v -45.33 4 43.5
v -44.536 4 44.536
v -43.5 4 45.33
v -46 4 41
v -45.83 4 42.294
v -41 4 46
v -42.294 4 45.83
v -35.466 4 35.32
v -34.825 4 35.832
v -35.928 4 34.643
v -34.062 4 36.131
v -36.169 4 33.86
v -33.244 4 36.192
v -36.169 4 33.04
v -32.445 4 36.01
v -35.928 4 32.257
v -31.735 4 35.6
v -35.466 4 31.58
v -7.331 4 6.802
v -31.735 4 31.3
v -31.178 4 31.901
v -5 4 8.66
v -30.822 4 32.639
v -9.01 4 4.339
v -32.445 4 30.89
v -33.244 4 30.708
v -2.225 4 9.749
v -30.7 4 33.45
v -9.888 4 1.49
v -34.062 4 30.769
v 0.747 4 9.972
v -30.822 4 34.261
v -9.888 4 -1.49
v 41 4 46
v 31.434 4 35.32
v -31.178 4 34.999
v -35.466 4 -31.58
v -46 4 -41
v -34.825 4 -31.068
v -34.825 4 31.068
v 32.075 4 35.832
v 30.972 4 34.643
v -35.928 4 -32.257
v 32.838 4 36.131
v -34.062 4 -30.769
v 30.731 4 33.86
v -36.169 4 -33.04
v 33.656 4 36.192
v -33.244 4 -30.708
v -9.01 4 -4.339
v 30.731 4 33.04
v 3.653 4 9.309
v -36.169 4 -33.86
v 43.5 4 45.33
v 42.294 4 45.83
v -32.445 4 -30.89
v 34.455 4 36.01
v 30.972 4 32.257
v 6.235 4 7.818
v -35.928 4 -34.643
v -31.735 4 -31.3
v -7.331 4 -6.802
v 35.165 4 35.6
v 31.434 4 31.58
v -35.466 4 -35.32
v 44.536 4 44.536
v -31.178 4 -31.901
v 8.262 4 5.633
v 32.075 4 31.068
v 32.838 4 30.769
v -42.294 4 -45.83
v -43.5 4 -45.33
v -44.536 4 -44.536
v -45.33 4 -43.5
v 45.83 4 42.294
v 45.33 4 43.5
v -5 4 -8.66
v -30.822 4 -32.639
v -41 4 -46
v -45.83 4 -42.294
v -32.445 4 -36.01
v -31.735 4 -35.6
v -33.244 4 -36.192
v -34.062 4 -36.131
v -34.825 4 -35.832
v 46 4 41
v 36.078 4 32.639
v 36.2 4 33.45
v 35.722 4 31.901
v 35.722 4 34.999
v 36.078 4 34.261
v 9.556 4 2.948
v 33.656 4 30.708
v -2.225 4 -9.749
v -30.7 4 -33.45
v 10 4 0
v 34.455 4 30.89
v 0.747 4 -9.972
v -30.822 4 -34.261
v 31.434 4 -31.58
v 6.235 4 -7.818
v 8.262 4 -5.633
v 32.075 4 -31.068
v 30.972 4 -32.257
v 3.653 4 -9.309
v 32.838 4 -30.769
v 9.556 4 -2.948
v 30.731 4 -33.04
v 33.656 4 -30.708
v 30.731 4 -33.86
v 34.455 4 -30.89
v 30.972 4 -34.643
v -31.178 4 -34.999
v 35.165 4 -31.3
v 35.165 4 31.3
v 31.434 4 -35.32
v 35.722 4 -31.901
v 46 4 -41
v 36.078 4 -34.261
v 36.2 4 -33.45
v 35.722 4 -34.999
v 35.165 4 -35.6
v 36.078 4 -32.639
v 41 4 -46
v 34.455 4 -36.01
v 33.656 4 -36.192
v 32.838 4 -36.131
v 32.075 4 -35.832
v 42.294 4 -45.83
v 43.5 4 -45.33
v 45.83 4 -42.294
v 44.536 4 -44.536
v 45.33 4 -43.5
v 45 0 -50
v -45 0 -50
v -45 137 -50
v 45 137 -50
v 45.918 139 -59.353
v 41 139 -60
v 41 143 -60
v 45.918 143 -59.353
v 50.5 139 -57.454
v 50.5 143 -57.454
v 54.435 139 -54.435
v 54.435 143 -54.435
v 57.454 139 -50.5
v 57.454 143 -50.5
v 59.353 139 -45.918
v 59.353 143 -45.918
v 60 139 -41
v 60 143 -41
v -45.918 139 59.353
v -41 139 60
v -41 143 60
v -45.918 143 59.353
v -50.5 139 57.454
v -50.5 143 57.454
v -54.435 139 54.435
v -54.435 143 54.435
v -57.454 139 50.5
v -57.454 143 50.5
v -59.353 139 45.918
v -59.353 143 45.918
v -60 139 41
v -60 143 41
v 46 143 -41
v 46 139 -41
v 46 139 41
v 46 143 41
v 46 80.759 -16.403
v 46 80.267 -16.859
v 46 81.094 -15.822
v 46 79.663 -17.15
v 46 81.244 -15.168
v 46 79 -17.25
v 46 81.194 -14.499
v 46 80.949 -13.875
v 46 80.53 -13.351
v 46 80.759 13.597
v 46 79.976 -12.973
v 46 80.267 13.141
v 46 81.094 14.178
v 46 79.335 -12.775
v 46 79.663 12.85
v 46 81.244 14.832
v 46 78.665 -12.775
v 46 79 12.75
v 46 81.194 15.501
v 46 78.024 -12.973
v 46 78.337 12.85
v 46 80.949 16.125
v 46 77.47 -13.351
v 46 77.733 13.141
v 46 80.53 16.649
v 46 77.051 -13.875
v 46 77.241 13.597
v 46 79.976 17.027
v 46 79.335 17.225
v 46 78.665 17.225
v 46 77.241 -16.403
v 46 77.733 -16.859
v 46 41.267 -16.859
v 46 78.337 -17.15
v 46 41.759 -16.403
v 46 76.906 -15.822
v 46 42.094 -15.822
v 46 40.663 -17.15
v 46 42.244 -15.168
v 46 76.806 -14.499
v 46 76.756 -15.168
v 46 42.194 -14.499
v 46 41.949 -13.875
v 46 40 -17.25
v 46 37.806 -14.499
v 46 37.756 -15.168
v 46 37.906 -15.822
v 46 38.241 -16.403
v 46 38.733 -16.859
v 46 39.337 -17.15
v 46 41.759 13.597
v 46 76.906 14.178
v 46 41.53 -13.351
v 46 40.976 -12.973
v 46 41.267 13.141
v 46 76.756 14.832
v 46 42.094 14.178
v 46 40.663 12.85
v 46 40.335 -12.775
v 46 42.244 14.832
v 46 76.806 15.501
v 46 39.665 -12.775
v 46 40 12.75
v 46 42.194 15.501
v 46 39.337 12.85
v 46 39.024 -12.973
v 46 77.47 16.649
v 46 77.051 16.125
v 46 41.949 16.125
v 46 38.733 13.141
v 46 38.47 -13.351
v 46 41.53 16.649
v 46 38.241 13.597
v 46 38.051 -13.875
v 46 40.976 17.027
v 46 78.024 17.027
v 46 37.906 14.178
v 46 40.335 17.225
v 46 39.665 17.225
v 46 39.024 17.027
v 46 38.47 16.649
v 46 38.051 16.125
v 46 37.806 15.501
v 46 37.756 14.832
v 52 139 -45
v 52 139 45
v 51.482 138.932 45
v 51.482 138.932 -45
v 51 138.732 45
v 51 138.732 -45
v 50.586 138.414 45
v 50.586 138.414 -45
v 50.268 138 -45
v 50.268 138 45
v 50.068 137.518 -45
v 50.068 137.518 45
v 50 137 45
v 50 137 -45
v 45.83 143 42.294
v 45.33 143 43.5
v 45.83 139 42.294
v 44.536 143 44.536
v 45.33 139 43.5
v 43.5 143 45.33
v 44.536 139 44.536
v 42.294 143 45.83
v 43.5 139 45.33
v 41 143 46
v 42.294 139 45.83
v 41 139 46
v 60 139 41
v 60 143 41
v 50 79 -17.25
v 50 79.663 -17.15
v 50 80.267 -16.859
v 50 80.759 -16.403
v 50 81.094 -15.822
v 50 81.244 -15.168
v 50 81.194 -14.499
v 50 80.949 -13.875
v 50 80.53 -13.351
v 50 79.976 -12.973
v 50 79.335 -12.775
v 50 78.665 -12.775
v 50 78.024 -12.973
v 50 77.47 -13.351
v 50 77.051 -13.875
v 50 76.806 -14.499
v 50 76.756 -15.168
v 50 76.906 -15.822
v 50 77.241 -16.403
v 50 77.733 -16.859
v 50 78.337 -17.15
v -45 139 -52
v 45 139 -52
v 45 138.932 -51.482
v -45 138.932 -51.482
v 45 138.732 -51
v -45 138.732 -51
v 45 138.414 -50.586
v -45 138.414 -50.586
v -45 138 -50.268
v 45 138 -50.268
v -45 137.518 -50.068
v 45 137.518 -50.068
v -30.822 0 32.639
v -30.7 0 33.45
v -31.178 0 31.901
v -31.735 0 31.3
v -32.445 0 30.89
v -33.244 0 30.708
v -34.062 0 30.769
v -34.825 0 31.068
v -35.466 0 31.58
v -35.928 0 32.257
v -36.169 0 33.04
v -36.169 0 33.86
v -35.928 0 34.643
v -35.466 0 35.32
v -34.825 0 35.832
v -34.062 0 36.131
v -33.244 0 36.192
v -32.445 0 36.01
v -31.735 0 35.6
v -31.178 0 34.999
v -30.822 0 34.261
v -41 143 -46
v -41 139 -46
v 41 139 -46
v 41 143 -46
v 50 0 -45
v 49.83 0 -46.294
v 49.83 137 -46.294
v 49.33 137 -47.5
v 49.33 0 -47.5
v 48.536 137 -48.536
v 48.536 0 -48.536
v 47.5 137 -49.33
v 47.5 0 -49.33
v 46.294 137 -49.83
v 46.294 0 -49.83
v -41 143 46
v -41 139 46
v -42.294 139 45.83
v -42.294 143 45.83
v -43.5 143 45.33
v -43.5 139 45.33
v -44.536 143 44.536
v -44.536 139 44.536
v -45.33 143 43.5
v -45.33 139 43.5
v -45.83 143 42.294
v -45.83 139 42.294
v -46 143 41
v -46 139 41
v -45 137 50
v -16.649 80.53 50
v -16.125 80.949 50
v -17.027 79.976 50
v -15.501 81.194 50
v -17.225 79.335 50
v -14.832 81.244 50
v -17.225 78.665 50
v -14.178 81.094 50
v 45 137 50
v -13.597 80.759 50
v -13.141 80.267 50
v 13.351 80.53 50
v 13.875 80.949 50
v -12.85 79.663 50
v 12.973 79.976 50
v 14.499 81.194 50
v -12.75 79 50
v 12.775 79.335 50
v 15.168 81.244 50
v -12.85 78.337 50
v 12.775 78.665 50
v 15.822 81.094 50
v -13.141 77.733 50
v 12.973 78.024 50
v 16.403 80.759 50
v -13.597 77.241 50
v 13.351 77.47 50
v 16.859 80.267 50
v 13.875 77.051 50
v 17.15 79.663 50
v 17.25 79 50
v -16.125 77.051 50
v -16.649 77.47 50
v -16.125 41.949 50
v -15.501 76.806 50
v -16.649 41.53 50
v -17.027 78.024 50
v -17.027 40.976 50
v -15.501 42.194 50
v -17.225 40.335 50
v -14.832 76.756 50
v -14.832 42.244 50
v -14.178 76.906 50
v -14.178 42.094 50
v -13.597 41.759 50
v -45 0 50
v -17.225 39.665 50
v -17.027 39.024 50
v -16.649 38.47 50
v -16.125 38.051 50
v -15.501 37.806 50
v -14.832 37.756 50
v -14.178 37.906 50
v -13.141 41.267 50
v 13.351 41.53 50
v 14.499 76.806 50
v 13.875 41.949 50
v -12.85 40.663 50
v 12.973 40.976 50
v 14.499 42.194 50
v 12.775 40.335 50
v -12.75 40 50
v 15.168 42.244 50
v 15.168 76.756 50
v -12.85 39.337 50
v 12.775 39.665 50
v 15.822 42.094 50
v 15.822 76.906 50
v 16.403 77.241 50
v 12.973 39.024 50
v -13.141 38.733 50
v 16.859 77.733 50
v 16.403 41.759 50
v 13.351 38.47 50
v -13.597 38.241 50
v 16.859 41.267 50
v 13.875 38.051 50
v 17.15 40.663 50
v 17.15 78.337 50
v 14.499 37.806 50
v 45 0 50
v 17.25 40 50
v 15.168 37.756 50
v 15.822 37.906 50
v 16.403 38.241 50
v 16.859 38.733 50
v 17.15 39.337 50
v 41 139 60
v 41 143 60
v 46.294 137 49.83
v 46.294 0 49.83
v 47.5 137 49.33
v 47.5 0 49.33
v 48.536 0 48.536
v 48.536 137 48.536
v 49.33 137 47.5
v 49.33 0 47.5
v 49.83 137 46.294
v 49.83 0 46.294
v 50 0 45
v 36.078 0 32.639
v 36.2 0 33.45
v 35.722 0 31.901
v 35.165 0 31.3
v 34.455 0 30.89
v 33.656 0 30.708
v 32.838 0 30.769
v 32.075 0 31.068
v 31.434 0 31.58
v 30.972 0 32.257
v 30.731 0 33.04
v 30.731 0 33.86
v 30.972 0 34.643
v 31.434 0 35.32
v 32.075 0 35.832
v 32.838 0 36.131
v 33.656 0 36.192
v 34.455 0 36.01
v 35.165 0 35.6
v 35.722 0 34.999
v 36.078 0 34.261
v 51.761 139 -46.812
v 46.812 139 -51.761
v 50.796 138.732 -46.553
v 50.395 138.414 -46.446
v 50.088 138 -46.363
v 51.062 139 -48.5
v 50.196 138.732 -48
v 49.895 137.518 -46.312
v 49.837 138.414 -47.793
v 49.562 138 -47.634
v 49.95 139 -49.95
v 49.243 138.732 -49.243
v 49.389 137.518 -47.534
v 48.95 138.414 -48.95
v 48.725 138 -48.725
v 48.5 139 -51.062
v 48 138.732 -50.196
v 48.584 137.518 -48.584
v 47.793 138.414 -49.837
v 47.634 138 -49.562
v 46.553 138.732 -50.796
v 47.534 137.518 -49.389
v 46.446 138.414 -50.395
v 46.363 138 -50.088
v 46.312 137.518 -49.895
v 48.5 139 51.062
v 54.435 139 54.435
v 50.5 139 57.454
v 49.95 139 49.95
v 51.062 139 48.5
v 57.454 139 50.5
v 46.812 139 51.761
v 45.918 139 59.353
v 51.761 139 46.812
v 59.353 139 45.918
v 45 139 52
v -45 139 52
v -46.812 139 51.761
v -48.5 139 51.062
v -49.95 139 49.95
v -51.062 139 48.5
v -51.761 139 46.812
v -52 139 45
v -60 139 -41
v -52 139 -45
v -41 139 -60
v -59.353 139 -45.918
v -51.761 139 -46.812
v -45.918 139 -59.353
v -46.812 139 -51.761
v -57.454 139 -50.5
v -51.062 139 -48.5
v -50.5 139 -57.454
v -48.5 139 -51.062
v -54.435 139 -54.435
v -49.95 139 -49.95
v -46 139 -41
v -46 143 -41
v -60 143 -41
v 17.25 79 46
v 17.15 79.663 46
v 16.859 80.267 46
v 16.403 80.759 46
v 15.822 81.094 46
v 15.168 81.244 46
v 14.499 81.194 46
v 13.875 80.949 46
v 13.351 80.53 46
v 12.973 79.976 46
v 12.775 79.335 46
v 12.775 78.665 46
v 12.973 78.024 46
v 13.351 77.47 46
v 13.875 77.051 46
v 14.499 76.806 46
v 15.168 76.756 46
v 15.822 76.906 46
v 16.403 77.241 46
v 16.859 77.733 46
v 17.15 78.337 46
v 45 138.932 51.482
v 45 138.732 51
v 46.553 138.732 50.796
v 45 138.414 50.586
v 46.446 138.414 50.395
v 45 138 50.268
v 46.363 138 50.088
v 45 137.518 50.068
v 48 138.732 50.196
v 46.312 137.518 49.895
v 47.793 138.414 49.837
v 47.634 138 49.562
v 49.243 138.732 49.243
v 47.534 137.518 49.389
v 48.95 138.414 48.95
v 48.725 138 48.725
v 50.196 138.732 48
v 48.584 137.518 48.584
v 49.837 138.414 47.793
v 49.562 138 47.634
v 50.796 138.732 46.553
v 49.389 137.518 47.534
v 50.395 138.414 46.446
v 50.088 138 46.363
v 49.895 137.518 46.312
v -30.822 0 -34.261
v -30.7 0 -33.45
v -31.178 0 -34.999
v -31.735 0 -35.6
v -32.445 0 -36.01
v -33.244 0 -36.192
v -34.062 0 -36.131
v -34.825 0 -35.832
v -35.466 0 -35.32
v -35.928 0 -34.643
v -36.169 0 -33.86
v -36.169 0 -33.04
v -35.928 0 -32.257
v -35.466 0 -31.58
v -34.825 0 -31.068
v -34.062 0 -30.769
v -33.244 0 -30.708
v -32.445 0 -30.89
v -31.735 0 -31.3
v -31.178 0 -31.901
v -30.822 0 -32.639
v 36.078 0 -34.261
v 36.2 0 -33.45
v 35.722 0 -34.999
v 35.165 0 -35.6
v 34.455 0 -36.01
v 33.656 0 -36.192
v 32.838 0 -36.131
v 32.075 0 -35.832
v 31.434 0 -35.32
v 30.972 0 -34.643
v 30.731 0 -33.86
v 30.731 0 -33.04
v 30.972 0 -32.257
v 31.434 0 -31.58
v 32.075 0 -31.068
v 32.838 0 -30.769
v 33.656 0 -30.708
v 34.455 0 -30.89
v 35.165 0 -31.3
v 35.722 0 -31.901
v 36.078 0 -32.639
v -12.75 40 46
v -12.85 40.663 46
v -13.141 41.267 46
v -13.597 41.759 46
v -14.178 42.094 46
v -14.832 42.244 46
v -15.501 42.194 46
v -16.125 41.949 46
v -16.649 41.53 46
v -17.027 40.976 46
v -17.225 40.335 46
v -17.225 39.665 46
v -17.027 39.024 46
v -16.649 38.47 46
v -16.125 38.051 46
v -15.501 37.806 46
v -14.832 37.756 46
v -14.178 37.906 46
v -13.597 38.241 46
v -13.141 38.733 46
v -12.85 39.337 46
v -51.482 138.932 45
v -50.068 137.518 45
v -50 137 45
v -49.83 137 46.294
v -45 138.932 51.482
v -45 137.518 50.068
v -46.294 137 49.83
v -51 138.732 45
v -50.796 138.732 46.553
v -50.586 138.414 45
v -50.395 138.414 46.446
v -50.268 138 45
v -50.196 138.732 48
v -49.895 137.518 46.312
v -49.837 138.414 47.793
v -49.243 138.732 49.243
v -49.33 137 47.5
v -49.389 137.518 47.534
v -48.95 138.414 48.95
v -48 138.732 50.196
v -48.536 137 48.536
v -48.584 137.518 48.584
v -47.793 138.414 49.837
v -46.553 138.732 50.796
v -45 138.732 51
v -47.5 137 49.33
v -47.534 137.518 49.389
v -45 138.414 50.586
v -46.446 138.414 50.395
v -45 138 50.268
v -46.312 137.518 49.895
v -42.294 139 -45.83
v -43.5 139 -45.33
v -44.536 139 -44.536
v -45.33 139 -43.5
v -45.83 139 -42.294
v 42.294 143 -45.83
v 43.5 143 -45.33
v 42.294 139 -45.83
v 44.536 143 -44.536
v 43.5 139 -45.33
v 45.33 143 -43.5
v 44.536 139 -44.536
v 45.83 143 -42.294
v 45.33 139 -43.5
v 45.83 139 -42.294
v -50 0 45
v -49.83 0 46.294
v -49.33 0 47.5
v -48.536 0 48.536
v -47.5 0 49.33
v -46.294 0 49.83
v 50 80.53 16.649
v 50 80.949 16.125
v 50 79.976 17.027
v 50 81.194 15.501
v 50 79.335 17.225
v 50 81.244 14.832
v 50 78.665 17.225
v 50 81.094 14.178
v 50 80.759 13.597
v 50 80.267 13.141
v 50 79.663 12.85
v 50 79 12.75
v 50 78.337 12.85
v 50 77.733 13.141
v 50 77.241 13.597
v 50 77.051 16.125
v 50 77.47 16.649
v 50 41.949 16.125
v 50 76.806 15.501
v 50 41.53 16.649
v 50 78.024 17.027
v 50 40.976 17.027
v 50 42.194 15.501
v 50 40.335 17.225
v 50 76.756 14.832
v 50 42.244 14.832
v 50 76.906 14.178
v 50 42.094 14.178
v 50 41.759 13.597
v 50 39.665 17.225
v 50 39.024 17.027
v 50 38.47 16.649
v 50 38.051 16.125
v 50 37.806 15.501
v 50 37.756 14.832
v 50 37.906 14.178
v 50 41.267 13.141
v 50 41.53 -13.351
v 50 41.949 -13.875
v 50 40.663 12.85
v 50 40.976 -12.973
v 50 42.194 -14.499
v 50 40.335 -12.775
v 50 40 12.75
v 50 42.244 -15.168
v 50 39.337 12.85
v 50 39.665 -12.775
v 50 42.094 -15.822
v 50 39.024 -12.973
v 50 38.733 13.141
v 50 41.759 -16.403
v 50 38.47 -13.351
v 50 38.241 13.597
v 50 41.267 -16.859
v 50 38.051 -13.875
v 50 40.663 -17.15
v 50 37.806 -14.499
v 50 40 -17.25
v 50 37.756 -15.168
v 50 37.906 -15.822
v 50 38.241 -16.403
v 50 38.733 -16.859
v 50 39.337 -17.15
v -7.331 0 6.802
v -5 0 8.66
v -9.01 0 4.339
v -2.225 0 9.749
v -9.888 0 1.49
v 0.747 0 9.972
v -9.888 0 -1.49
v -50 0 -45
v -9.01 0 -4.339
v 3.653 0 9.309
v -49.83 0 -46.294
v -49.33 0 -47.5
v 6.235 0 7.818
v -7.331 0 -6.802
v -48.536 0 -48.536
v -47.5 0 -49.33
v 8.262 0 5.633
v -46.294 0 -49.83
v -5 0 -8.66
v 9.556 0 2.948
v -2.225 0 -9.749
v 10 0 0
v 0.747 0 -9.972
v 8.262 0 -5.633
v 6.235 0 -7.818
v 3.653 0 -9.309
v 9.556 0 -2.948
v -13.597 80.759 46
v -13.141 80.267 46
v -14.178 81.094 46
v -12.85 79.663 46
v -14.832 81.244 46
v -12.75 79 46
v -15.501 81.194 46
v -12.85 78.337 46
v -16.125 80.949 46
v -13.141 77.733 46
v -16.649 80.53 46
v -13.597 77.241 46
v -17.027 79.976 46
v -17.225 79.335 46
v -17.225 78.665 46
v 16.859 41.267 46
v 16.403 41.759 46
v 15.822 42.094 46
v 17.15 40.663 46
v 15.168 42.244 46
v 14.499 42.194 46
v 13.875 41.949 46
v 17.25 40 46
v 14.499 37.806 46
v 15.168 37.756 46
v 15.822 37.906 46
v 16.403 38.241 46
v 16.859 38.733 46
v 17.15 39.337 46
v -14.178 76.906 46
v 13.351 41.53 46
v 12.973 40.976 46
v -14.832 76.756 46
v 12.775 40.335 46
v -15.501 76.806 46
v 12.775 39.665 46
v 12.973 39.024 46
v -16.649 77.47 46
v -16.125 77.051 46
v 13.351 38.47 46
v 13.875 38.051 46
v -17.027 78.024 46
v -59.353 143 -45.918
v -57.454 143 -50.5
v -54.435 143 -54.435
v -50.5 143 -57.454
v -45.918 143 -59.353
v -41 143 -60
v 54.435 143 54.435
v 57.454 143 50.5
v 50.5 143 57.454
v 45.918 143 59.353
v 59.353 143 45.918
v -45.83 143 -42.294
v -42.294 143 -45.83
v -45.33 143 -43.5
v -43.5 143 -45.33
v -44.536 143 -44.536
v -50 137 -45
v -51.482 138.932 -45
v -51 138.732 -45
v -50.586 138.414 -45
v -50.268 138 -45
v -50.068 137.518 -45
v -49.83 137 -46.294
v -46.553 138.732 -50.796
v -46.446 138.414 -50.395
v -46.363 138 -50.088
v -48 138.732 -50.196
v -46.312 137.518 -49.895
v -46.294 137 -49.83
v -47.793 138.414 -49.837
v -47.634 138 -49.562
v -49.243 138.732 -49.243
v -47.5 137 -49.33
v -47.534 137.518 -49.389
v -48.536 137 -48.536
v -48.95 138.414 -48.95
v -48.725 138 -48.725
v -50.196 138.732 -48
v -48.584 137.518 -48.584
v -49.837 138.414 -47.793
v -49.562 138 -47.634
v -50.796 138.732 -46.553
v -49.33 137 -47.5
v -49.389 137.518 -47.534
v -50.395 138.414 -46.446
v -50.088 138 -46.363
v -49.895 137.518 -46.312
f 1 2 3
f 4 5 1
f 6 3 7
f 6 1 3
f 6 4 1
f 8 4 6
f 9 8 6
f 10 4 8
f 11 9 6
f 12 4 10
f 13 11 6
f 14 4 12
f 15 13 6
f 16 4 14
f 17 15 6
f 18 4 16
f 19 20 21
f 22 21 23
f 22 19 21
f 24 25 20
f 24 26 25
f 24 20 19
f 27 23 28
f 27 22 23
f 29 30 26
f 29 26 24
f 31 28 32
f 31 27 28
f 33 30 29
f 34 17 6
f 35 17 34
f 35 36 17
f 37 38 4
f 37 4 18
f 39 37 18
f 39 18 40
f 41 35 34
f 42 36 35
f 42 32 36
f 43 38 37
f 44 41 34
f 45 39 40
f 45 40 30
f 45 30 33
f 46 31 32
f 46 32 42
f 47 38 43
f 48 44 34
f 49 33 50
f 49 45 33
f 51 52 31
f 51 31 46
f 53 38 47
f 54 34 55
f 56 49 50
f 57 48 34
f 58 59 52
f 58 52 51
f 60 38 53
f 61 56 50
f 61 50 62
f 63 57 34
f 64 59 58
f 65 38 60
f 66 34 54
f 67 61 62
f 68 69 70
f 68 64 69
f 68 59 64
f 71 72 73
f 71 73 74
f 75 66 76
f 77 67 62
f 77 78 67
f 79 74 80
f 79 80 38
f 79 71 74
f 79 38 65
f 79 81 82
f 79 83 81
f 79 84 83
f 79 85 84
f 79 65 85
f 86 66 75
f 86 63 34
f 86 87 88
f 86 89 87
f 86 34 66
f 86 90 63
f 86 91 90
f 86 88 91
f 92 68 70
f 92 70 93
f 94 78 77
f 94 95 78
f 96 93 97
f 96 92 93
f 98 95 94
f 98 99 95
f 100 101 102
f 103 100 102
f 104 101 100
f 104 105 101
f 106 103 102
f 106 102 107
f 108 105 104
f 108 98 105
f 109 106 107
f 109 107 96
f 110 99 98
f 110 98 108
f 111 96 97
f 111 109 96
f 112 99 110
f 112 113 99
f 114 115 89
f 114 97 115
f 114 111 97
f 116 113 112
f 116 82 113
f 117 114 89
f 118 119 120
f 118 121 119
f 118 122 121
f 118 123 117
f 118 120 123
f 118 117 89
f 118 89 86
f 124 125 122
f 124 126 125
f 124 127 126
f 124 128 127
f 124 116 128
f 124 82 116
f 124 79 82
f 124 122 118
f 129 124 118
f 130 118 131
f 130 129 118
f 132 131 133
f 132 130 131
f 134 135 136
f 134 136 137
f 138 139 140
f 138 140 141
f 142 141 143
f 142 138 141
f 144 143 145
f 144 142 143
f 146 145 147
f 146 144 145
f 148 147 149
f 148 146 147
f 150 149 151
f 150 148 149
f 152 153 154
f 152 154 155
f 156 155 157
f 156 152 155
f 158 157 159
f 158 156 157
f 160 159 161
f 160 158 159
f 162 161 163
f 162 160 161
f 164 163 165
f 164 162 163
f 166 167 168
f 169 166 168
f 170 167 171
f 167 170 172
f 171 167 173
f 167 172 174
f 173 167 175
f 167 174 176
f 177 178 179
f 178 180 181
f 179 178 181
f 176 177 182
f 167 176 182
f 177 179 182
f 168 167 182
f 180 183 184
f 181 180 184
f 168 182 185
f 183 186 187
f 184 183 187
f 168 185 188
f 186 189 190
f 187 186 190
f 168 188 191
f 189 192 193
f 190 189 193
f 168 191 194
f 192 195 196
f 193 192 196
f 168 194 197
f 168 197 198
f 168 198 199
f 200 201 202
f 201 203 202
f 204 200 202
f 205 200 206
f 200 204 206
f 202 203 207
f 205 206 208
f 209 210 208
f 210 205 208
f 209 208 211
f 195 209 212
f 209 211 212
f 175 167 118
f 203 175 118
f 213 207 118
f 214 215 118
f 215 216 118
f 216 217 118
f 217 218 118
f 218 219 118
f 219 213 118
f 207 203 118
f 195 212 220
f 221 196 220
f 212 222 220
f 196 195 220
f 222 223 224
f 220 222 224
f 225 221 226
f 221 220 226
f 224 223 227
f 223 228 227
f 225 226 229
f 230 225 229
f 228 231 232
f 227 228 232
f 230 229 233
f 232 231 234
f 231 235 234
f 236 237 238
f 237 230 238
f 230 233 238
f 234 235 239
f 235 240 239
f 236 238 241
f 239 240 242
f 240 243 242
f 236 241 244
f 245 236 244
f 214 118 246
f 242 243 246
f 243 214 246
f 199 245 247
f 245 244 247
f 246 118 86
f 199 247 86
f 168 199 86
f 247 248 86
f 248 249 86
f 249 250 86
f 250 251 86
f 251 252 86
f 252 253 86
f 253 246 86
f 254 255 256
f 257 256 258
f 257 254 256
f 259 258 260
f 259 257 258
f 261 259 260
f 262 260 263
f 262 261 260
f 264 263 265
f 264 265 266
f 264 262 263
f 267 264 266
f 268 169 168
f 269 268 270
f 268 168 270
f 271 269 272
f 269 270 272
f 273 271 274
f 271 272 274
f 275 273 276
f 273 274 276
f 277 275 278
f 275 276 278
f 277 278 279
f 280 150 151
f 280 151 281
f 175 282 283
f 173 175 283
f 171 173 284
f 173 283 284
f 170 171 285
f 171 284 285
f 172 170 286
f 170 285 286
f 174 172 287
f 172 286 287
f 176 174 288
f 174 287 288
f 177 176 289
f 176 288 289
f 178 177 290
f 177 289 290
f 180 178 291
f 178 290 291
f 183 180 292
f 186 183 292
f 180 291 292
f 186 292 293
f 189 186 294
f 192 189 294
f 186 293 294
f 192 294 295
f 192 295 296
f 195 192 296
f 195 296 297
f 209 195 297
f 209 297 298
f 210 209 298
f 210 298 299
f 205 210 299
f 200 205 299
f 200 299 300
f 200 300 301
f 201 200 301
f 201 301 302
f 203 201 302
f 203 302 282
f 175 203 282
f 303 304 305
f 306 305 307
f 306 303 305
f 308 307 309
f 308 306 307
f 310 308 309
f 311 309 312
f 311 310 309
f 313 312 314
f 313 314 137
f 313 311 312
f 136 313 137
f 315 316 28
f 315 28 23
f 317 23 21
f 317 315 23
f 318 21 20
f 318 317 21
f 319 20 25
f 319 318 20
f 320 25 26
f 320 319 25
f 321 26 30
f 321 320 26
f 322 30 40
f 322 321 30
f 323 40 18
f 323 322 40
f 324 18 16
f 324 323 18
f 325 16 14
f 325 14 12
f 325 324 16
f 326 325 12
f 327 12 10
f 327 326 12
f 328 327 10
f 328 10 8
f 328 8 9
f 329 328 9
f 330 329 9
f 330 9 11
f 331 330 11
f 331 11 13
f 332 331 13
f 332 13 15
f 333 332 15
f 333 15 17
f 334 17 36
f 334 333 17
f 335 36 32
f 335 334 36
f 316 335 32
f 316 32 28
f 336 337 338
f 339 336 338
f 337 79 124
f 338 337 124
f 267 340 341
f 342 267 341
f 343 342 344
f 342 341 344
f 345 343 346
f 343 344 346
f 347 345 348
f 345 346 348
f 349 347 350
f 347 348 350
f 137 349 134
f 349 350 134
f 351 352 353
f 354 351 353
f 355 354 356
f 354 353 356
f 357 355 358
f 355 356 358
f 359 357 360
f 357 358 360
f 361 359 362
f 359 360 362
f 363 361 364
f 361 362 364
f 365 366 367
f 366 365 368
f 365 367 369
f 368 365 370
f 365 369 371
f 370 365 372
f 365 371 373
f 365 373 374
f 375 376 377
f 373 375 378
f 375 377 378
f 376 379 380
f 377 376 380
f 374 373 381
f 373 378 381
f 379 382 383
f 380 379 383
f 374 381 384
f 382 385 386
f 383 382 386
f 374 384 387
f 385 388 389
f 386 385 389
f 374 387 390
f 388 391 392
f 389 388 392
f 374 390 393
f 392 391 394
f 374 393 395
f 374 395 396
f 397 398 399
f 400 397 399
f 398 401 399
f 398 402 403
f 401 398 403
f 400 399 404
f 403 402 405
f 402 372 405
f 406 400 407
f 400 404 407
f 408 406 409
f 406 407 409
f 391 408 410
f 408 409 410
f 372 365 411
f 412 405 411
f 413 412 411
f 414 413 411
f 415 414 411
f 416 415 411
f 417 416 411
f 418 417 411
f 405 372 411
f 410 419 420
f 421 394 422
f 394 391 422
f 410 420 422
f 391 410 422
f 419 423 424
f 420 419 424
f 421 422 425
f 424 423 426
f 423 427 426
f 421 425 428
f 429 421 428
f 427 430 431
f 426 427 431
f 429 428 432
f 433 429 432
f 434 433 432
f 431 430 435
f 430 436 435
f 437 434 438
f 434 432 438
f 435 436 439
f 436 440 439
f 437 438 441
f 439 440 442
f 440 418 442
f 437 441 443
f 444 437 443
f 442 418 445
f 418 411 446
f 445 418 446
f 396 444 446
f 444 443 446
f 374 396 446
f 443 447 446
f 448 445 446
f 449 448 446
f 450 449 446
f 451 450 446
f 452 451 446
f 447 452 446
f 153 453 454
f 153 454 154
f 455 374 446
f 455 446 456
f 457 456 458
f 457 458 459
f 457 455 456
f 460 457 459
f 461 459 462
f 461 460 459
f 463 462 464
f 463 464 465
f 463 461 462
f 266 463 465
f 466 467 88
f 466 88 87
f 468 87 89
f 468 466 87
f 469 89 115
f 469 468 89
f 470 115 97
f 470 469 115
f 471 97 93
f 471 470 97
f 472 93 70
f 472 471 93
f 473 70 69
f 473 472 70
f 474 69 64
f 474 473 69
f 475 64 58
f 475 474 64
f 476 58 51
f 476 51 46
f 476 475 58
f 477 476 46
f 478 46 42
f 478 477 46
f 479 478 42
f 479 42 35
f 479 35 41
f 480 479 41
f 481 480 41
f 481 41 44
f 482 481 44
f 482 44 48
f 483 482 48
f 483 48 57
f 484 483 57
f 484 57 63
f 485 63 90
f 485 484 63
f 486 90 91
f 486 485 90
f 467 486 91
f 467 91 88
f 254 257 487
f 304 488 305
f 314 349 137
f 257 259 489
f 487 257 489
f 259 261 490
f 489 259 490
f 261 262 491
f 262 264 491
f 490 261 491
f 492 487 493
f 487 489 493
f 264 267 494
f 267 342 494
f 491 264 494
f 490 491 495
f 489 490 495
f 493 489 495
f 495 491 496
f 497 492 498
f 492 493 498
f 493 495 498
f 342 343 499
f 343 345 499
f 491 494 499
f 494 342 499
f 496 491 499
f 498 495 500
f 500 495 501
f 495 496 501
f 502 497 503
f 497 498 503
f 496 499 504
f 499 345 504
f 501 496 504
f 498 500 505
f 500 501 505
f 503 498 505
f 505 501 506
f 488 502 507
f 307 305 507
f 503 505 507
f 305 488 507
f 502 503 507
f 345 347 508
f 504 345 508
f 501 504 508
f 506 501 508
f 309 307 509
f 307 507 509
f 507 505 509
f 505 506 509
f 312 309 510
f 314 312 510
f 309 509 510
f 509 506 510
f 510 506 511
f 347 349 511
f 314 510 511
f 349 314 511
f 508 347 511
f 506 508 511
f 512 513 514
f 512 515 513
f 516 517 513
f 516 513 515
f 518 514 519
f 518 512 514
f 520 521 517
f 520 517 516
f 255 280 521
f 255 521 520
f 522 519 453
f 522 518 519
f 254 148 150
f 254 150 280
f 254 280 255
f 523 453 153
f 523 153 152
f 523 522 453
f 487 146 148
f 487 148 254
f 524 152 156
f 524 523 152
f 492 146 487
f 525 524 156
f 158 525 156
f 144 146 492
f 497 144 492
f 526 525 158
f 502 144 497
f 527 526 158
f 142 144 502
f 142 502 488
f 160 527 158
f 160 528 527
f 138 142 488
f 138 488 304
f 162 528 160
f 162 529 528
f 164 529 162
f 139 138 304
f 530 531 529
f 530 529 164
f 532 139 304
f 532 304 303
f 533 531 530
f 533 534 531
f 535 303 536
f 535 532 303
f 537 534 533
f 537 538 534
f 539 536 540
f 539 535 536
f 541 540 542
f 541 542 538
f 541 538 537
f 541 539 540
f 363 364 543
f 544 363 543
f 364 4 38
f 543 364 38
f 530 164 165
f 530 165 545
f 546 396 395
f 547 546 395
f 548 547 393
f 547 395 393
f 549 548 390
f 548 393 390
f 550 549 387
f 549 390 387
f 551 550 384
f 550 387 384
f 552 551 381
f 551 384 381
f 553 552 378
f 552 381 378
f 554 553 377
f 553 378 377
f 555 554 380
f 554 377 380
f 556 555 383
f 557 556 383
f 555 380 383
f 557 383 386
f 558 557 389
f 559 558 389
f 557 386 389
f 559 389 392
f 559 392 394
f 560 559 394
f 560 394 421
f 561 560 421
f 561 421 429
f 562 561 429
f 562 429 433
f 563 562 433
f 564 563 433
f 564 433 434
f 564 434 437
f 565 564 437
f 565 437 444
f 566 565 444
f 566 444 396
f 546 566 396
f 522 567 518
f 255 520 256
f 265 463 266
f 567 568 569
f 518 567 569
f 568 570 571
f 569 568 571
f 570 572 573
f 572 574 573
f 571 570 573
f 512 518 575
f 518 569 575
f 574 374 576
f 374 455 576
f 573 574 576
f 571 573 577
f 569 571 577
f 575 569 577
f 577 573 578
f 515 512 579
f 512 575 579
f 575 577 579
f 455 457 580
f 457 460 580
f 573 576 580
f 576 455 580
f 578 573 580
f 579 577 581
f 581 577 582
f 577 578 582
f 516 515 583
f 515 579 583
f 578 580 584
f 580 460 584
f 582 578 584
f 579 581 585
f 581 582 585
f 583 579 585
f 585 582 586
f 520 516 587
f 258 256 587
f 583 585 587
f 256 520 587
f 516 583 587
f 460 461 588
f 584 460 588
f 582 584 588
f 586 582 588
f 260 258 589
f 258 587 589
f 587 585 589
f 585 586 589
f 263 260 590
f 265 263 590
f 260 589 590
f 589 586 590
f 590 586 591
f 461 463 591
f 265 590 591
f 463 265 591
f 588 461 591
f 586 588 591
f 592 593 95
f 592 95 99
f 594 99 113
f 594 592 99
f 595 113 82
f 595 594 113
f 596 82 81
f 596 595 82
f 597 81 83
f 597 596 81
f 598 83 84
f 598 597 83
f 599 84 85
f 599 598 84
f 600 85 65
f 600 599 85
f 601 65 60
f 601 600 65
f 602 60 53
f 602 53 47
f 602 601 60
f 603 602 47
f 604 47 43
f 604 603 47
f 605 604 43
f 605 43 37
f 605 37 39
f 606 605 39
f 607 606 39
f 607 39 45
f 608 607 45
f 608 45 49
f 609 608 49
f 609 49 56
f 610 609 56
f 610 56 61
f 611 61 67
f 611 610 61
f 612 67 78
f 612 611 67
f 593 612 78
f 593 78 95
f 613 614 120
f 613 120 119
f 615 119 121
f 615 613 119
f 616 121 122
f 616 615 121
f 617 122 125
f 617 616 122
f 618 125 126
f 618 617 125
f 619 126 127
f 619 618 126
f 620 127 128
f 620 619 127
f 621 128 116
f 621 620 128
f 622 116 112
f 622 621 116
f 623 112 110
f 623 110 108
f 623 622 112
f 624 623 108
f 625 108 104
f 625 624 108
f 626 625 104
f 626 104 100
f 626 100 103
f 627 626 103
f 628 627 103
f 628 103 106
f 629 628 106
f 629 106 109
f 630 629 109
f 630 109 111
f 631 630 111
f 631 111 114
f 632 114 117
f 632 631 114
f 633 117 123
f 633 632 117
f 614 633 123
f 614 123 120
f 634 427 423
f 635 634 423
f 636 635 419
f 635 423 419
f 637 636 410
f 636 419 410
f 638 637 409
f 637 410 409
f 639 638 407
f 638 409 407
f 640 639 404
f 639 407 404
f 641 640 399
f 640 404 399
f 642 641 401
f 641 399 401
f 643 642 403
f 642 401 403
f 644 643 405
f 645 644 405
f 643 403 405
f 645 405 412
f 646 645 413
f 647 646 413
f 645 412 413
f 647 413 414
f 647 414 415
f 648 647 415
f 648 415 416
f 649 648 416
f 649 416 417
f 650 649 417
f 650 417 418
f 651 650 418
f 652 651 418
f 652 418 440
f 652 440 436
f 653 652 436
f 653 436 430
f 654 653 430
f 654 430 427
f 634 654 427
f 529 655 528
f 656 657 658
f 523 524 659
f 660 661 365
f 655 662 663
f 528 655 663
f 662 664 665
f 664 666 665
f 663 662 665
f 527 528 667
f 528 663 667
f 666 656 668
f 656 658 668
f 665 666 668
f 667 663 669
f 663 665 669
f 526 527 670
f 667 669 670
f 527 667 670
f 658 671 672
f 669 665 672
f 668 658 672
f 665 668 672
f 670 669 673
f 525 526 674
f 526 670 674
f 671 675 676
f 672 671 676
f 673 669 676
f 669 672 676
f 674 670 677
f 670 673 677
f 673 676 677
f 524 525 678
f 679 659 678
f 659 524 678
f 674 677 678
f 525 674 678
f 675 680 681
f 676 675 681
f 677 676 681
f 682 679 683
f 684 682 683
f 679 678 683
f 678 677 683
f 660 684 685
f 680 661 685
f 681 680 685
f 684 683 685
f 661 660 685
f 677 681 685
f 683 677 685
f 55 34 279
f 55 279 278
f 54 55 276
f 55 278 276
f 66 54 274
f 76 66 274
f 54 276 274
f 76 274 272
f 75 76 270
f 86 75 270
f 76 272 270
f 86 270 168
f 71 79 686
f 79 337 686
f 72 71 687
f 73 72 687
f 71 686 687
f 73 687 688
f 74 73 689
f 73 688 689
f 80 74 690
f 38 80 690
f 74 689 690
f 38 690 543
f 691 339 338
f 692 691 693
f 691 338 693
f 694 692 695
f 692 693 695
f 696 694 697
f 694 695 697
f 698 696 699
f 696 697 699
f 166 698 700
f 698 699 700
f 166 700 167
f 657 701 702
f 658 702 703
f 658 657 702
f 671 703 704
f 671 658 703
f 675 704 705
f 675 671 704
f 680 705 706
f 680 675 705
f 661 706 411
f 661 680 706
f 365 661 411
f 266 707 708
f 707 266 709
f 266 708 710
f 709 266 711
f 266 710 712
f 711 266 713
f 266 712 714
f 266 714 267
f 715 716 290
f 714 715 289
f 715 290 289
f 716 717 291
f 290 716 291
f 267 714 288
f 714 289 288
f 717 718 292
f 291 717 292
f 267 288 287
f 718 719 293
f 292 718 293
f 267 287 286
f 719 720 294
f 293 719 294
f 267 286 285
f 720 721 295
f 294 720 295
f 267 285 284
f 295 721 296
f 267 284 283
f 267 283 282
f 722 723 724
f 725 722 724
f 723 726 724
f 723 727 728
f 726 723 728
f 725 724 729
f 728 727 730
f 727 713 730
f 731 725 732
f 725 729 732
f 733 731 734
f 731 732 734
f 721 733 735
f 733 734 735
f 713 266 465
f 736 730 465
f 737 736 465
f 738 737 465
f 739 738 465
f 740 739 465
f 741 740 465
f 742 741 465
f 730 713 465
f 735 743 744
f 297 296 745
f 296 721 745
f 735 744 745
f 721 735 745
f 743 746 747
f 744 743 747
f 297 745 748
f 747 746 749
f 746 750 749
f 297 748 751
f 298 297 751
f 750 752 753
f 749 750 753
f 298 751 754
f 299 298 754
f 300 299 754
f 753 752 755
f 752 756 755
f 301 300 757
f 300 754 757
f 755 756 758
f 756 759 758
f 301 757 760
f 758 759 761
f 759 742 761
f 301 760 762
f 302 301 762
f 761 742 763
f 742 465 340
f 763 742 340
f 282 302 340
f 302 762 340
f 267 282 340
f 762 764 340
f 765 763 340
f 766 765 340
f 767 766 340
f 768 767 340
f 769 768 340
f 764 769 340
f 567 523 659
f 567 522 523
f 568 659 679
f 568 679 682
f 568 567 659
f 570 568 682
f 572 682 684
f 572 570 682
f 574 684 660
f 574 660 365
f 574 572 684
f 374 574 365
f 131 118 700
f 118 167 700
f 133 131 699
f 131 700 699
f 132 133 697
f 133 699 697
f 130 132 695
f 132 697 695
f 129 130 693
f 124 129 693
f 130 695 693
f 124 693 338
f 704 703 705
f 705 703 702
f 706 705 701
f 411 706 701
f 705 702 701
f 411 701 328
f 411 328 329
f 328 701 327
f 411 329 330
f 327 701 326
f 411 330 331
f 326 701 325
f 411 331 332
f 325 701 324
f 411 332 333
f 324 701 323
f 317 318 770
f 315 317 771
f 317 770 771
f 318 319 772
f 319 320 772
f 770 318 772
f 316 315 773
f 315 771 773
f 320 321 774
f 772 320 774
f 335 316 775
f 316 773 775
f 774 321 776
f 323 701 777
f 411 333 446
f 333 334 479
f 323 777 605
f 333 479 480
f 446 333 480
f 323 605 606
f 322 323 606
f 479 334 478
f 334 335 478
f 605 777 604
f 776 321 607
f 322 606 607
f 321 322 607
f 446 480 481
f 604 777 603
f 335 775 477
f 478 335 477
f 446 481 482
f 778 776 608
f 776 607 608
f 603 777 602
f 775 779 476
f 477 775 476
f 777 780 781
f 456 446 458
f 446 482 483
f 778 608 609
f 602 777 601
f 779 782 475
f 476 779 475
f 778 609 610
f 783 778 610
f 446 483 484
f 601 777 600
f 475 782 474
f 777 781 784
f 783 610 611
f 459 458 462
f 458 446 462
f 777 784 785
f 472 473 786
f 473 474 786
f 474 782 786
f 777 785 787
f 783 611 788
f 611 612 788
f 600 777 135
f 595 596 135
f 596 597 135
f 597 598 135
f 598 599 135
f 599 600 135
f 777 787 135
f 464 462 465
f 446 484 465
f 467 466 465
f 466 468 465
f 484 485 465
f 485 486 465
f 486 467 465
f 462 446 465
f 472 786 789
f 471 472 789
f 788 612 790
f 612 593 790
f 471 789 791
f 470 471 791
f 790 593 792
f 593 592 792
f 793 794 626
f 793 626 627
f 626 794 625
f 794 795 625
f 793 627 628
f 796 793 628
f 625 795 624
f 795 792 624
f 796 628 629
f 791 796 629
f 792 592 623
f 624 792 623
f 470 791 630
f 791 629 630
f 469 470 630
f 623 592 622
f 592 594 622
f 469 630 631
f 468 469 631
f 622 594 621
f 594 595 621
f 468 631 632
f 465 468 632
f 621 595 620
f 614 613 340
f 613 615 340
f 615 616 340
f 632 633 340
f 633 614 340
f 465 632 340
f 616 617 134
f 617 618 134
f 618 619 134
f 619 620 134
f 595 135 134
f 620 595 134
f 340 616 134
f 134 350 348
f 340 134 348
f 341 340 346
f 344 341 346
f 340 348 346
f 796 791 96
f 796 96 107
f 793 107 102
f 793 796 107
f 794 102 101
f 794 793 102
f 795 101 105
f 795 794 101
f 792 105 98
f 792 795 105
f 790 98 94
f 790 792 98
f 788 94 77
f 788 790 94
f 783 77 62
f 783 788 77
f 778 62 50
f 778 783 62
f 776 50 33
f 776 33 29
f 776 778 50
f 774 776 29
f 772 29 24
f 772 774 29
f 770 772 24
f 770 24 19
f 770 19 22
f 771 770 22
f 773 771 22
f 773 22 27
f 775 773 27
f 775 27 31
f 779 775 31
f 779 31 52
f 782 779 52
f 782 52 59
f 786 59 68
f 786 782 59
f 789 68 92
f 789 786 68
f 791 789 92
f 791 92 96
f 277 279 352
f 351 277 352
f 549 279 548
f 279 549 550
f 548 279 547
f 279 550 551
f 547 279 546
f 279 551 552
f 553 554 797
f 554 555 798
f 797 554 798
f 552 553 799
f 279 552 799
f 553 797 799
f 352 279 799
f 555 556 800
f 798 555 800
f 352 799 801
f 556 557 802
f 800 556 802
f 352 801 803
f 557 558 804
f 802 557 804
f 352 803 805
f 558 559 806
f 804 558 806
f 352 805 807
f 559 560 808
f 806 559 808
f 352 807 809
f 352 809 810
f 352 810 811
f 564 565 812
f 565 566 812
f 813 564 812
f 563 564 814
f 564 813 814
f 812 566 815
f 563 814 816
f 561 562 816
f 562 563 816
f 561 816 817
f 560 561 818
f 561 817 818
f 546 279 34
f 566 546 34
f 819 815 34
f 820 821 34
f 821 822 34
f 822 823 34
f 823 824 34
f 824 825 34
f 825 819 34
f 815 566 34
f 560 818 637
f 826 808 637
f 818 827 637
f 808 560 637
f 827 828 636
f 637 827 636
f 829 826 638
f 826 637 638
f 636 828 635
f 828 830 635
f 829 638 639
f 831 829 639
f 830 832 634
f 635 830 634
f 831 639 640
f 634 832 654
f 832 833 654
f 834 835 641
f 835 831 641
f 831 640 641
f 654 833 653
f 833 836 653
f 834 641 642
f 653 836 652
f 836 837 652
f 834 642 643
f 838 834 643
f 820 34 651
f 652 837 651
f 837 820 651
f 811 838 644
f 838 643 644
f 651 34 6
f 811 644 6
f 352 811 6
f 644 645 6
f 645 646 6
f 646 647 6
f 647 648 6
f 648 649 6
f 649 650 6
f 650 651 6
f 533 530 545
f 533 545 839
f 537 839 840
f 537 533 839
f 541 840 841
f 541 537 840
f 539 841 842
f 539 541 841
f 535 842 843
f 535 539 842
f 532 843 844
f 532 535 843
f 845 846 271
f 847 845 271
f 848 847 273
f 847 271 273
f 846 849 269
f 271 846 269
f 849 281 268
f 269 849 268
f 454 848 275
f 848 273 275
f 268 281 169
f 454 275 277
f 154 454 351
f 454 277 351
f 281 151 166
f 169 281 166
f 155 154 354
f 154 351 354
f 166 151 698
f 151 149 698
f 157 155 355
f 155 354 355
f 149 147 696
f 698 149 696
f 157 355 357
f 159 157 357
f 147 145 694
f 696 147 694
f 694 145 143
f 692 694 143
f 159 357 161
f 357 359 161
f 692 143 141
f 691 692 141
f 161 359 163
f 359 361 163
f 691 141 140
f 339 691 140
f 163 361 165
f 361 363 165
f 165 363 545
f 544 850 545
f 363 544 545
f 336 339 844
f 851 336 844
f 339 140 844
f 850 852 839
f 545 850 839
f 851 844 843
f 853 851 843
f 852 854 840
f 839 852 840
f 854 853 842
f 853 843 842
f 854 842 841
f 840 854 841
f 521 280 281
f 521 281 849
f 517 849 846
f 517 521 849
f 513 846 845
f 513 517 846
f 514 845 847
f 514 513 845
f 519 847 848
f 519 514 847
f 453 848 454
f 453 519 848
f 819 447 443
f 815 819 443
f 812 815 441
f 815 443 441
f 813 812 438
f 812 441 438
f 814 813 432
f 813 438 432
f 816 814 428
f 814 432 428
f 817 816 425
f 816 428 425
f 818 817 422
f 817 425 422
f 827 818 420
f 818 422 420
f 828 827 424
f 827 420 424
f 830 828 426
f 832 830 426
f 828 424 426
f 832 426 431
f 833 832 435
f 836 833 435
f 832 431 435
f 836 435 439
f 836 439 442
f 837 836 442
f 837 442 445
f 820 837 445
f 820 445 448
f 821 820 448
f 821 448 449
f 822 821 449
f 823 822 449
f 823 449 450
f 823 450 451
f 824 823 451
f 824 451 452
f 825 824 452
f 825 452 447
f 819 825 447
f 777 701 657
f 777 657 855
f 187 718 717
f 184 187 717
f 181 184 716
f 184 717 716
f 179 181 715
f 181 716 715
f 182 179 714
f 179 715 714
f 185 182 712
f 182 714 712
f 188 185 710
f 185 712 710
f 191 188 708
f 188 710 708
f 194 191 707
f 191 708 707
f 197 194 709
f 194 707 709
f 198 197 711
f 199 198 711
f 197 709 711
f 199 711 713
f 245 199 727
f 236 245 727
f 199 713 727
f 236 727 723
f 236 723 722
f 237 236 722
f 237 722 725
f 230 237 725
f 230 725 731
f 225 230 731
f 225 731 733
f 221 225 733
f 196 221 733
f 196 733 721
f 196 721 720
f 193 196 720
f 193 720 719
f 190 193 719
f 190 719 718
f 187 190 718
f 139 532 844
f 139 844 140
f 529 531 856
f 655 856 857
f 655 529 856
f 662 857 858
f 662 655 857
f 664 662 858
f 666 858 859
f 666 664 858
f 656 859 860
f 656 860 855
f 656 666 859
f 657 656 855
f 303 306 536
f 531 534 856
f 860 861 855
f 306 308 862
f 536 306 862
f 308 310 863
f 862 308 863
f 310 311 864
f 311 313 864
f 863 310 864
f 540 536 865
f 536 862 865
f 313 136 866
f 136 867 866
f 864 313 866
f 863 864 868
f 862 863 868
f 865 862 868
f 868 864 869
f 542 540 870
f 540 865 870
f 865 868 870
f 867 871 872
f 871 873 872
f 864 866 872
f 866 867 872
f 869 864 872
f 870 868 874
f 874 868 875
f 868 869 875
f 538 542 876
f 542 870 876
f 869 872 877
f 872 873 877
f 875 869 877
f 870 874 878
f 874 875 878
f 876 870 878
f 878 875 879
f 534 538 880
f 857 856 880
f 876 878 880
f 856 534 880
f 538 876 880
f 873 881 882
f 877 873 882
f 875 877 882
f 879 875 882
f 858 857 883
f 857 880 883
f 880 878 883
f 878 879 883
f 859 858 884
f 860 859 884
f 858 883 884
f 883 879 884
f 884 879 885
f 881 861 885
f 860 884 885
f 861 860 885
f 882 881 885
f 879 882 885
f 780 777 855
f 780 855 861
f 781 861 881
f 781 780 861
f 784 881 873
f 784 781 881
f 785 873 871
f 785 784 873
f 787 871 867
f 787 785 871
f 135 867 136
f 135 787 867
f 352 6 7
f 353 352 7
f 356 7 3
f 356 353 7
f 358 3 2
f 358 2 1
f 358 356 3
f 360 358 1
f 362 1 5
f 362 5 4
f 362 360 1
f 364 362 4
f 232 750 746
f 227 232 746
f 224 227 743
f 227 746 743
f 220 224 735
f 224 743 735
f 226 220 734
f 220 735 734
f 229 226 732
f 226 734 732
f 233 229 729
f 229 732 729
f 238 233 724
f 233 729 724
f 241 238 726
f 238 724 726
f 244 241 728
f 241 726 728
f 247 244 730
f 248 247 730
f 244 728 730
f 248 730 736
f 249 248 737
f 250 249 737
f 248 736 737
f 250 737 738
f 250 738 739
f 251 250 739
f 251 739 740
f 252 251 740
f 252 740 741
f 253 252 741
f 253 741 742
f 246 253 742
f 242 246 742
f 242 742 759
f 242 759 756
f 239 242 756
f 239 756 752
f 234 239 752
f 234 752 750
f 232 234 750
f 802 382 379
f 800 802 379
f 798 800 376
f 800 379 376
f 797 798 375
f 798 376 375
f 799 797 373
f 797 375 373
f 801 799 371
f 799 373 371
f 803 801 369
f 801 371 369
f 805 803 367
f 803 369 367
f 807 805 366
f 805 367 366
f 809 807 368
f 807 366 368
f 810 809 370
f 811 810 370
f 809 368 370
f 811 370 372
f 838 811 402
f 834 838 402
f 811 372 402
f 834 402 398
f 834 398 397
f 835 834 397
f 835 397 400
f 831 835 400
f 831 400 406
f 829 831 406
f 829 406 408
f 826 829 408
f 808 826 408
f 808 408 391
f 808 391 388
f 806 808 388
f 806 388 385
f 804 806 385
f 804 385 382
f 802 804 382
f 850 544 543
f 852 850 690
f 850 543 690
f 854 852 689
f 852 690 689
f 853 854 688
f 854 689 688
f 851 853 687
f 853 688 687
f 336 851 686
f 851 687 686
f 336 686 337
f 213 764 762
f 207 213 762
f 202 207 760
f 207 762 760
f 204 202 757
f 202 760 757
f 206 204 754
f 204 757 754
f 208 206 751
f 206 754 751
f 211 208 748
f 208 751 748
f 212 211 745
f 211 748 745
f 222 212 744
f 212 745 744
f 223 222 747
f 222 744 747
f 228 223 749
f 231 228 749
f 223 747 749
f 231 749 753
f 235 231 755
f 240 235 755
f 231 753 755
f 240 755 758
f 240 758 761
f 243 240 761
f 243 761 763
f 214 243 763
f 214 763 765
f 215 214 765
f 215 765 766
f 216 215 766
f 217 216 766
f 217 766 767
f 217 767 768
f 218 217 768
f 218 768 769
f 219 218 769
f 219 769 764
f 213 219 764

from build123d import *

# Parameters (mm, degrees)
SKETCH1_W           = 100
SKETCH1_H           = 100
SKETCH1_R           = 10
SKETCH1_R_2         = 2.75
BOSS_EXTRUDE1_DEPTH = 4
SKETCH2_W           = 100
SKETCH2_H           = 100
SKETCH2_W_2         = 92
SKETCH2_H_2         = 92
BOSS_EXTRUDE2_DEPTH = 135
FILLET1_R           = 5
BOSS_EXTRUDE3_DEPTH = 4
FILLET2_R           = 2
CUT_EXTRUDE1_REACH  = 112
SKETCH4_R           = 2.25
CUT_EXTRUDE2_REACH  = 112
SKETCH5_R           = 2.25


with BuildPart() as part:
    # Sketch1 → Boss-Extrude1 (new body)
    with BuildSketch(Plane(origin=(0, 0, 0), x_dir=(1, 0, 0), z_dir=(0, 1, 0))):
        Rectangle(SKETCH1_W, SKETCH1_H)
        Circle(SKETCH1_R, mode=Mode.SUBTRACT)
        with Locations((33.45, 33.45)):
            Circle(SKETCH1_R_2, mode=Mode.SUBTRACT)
        with Locations((33.45, -33.45)):
            Circle(SKETCH1_R_2, mode=Mode.SUBTRACT)
        with Locations((-33.45, -33.45)):
            Circle(SKETCH1_R_2, mode=Mode.SUBTRACT)
        with Locations((-33.45, 33.45)):
            Circle(SKETCH1_R_2, mode=Mode.SUBTRACT)
    extrude(amount=BOSS_EXTRUDE1_DEPTH)

    # Sketch2 → Boss-Extrude2 (add)
    with BuildSketch(Plane(origin=(0, 4, 0), x_dir=(1, 0, 0), z_dir=(0, 1, 0))):
        Rectangle(SKETCH2_W, SKETCH2_H)
        Rectangle(SKETCH2_W_2, SKETCH2_H_2, mode=Mode.SUBTRACT)
    extrude(amount=BOSS_EXTRUDE2_DEPTH)

    # Fillet1
    fillet1_edges = [part.edges().sort_by_distance(p)[0] for p in [
        (-46, 71.5, 46),
        (46, 71.5, 46),
        (46, 71.5, -46),
        (-46, 71.5, -46),
        (-50, 69.5, -50),
        (50, 69.5, -50),
        (50, 69.5, 50),
        (-50, 69.5, 50),
    ]]
    fillet(fillet1_edges, radius=FILLET1_R)

    # Sketch3 → Boss-Extrude3 (add)
    with BuildSketch(Plane(origin=(0, 139, 0), x_dir=(1, 0, 0), z_dir=(0, 1, 0))):
        with BuildLine():
            Line((-41, 60), (41, 60))
            ThreePointArc((41, 60), (54.435028843, 54.435028843), (60, 41))
            Line((60, 41), (60, -41))
            ThreePointArc((60, -41), (54.435028843, -54.435028843), (41, -60))
            Line((41, -60), (-41, -60))
            ThreePointArc((-41, -60), (-54.435028843, -54.435028843), (-60, -41))
            Line((-60, -41), (-60, 41))
            ThreePointArc((-60, 41), (-54.435028843, 54.435028843), (-41, 60))
        make_face()
        with BuildLine():
            Line((-41, 46), (41, 46))
            ThreePointArc((41, 46), (44.535533906, 44.535533906), (46, 41))
            Line((46, 41), (46, -41))
            ThreePointArc((46, -41), (44.535533906, -44.535533906), (41, -46))
            Line((41, -46), (-41, -46))
            ThreePointArc((-41, -46), (-44.535533906, -44.535533906), (-46, -41))
            Line((-46, -41), (-46, 41))
            ThreePointArc((-46, 41), (-44.535533906, 44.535533906), (-41, 46))
        make_face(mode=Mode.SUBTRACT)
    extrude(amount=BOSS_EXTRUDE3_DEPTH)

    # Fillet2
    fillet2_edges = [part.edges().sort_by_distance(p)[0] for p in [
        (0, 139, 50),
        (-50, 139, 0),
        (50, 139, 0),
        (0, 139, -50),
        (-48.535533906, 139, -48.535533906),
        (48.535533906, 139, -48.535533906),
        (48.535533906, 139, 48.535533906),
        (-48.535533906, 139, 48.535533906),
    ]]
    fillet(fillet2_edges, radius=FILLET2_R)

    # Sketch4 → Cut-Extrude1 (cut, up to next)
    with BuildSketch(Plane(origin=(50, 0, 0), x_dir=(0, 0, -1), z_dir=(1, 0, 0)), mode=Mode.PRIVATE) as cut_extrude1_sk1:
        with Locations((-15, 79)):
            Circle(SKETCH4_R)
    cut_extrude1_tool1 = extrude(cut_extrude1_sk1.sketch, amount=-CUT_EXTRUDE1_REACH, mode=Mode.PRIVATE) & part.part
    add(cut_extrude1_tool1.solids().sort_by_distance((50, 79, 15))[0], mode=Mode.SUBTRACT)
    # Sketch4 → Cut-Extrude1 (cut, up to next)
    with BuildSketch(Plane(origin=(50, 0, 0), x_dir=(0, 0, -1), z_dir=(1, 0, 0)), mode=Mode.PRIVATE) as cut_extrude1_sk2:
        with Locations((15, 79)):
            Circle(SKETCH4_R)
    cut_extrude1_tool2 = extrude(cut_extrude1_sk2.sketch, amount=-CUT_EXTRUDE1_REACH, mode=Mode.PRIVATE) & part.part
    add(cut_extrude1_tool2.solids().sort_by_distance((50, 79, -15))[0], mode=Mode.SUBTRACT)
    # Sketch4 → Cut-Extrude1 (cut, up to next)
    with BuildSketch(Plane(origin=(50, 0, 0), x_dir=(0, 0, -1), z_dir=(1, 0, 0)), mode=Mode.PRIVATE) as cut_extrude1_sk3:
        with Locations((15, 40)):
            Circle(SKETCH4_R)
    cut_extrude1_tool3 = extrude(cut_extrude1_sk3.sketch, amount=-CUT_EXTRUDE1_REACH, mode=Mode.PRIVATE) & part.part
    add(cut_extrude1_tool3.solids().sort_by_distance((50, 40, -15))[0], mode=Mode.SUBTRACT)
    # Sketch4 → Cut-Extrude1 (cut, up to next)
    with BuildSketch(Plane(origin=(50, 0, 0), x_dir=(0, 0, -1), z_dir=(1, 0, 0)), mode=Mode.PRIVATE) as cut_extrude1_sk4:
        with Locations((-15, 40)):
            Circle(SKETCH4_R)
    cut_extrude1_tool4 = extrude(cut_extrude1_sk4.sketch, amount=-CUT_EXTRUDE1_REACH, mode=Mode.PRIVATE) & part.part
    add(cut_extrude1_tool4.solids().sort_by_distance((50, 40, 15))[0], mode=Mode.SUBTRACT)

    # Sketch5 → Cut-Extrude2 (cut, up to next)
    with BuildSketch(Plane.XY.offset(50), mode=Mode.PRIVATE) as cut_extrude2_sk1:
        with Locations((15, 79)):
            Circle(SKETCH5_R)
    cut_extrude2_tool1 = extrude(cut_extrude2_sk1.sketch, amount=-CUT_EXTRUDE2_REACH, mode=Mode.PRIVATE) & part.part
    add(cut_extrude2_tool1.solids().sort_by_distance((15, 79, 50))[0], mode=Mode.SUBTRACT)
    # Sketch5 → Cut-Extrude2 (cut, up to next)
    with BuildSketch(Plane.XY.offset(50), mode=Mode.PRIVATE) as cut_extrude2_sk2:
        with Locations((-15, 79)):
            Circle(SKETCH5_R)
    cut_extrude2_tool2 = extrude(cut_extrude2_sk2.sketch, amount=-CUT_EXTRUDE2_REACH, mode=Mode.PRIVATE) & part.part
    add(cut_extrude2_tool2.solids().sort_by_distance((-15, 79, 50))[0], mode=Mode.SUBTRACT)
    # Sketch5 → Cut-Extrude2 (cut, up to next)
    with BuildSketch(Plane.XY.offset(50), mode=Mode.PRIVATE) as cut_extrude2_sk3:
        with Locations((-15, 40)):
            Circle(SKETCH5_R)
    cut_extrude2_tool3 = extrude(cut_extrude2_sk3.sketch, amount=-CUT_EXTRUDE2_REACH, mode=Mode.PRIVATE) & part.part
    add(cut_extrude2_tool3.solids().sort_by_distance((-15, 40, 50))[0], mode=Mode.SUBTRACT)
    # Sketch5 → Cut-Extrude2 (cut, up to next)
    with BuildSketch(Plane.XY.offset(50), mode=Mode.PRIVATE) as cut_extrude2_sk4:
        with Locations((15, 40)):
            Circle(SKETCH5_R)
    cut_extrude2_tool4 = extrude(cut_extrude2_sk4.sketch, amount=-CUT_EXTRUDE2_REACH, mode=Mode.PRIVATE) & part.part
    add(cut_extrude2_tool4.solids().sort_by_distance((15, 40, 50))[0], mode=Mode.SUBTRACT)


solid = part.part
